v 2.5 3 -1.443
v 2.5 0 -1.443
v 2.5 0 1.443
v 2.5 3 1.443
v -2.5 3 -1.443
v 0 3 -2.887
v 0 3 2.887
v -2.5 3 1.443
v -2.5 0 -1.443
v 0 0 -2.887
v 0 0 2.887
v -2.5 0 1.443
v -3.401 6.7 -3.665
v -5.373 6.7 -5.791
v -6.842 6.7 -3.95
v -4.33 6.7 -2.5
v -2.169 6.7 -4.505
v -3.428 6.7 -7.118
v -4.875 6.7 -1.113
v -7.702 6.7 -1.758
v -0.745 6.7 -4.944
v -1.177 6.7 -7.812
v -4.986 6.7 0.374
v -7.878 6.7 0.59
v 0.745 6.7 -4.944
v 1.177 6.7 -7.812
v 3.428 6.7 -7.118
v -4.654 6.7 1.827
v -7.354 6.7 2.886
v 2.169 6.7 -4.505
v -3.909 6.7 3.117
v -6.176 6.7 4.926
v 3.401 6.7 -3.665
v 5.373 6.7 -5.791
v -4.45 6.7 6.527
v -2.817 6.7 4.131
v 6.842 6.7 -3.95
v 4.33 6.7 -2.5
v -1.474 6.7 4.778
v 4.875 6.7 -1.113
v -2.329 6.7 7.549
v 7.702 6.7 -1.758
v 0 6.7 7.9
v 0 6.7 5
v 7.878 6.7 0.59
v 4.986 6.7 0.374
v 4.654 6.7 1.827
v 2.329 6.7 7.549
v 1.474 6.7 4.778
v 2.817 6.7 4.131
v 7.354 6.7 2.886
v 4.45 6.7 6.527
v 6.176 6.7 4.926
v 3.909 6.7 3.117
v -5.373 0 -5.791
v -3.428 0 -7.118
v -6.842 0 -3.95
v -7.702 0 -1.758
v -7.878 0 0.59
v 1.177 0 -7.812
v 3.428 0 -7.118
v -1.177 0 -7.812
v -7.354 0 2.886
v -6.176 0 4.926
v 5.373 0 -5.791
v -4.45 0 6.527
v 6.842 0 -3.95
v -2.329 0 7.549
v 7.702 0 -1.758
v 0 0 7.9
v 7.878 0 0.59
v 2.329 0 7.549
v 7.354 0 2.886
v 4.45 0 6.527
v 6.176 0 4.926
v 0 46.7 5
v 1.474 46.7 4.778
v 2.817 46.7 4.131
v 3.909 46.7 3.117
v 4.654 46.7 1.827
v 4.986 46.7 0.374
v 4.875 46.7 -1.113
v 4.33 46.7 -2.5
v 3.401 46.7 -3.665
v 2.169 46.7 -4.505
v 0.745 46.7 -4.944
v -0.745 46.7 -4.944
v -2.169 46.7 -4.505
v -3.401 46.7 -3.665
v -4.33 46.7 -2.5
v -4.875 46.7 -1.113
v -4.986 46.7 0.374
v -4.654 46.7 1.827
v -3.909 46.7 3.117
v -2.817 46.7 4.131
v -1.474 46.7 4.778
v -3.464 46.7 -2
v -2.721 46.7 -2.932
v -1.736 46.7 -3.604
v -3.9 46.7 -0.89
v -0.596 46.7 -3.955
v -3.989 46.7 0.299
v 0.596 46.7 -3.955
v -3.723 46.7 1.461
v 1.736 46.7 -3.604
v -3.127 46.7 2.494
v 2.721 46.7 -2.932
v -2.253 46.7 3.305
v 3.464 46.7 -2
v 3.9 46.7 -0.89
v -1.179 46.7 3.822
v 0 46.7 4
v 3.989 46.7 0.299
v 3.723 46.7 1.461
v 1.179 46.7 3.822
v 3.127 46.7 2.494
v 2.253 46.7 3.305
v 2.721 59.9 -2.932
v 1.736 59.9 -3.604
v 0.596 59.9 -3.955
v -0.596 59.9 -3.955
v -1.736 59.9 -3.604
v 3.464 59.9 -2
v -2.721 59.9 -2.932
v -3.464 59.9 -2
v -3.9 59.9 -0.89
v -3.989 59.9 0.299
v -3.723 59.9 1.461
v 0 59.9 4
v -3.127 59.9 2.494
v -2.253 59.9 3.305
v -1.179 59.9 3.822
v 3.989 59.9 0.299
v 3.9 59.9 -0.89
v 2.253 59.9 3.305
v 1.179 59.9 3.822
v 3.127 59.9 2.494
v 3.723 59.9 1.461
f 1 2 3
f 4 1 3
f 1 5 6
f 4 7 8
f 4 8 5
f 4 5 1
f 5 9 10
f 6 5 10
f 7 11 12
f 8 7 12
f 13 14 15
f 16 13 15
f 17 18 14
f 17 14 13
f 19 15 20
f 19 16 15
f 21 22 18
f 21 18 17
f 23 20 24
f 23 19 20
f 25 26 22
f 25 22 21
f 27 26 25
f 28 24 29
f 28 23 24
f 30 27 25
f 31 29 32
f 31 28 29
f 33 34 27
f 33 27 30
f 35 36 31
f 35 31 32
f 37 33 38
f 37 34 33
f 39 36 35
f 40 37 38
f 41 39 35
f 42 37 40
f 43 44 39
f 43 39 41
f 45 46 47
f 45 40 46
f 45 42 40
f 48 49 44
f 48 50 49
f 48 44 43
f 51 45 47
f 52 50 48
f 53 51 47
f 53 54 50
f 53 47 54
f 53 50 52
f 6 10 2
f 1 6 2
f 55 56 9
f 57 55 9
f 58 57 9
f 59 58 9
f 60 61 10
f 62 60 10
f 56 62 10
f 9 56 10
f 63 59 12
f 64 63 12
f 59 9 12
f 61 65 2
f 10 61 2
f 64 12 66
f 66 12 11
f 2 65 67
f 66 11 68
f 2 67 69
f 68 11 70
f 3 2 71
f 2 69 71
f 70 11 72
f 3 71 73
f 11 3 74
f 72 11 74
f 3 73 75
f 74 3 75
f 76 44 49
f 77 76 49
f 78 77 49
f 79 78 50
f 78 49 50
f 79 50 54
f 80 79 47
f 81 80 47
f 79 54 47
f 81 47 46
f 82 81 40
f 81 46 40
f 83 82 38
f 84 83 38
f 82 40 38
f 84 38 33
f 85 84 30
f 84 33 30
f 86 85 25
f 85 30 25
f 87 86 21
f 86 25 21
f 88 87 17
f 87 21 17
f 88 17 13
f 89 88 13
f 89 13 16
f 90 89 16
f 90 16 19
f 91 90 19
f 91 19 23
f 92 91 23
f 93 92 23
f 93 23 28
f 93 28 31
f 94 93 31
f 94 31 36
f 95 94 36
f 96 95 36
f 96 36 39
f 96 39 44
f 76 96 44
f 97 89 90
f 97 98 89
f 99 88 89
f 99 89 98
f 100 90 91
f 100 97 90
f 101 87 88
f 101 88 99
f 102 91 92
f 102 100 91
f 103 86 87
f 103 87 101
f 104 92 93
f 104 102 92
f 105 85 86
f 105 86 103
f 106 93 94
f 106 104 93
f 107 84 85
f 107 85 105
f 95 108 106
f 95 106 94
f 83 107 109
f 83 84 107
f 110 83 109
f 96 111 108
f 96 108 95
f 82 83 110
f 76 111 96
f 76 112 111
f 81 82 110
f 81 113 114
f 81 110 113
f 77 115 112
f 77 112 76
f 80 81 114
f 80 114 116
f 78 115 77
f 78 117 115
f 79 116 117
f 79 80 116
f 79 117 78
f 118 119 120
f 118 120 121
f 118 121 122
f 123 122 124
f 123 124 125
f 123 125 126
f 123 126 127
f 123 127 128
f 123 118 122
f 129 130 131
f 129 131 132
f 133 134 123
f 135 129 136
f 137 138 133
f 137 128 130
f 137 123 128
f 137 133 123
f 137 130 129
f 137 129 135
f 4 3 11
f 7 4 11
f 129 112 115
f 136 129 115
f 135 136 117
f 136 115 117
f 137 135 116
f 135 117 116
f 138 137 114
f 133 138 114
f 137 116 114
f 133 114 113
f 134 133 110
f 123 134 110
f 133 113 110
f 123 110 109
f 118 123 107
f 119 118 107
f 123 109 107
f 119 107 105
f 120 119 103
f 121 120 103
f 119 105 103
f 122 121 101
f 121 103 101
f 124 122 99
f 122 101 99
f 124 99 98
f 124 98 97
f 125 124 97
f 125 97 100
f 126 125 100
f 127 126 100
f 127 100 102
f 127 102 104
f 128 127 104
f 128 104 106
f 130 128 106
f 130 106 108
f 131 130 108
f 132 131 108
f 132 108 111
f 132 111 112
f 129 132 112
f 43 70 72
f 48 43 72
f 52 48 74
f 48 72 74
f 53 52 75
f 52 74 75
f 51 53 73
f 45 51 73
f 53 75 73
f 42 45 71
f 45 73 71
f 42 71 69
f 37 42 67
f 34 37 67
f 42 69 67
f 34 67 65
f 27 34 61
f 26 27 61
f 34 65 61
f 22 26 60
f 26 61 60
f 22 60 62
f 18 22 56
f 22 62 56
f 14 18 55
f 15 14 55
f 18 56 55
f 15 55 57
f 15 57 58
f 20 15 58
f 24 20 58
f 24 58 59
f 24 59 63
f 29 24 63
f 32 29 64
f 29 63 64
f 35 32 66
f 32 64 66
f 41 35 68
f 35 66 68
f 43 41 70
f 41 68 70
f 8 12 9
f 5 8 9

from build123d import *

# Parameters (mm, degrees)
SKETCH_1_R          = 4
EXTRUDE_1_DEPTH     = 59.9
SKETCH_1_3_R        = 5
SKETCH_1_3_R_2      = 4
EXTRUDE_2_DEPTH     = 46.7
SKETCH_1_4_R        = 7.9
SKETCH_1_4_R_2      = 5
EXTRUDE_3_DEPTH     = 6.7
CUT_EXTRUDE_1_DEPTH = 3


with BuildPart() as part:
    # 草图1 → 凸台-拉伸1 (new body)
    with BuildSketch(Plane(origin=(0, 0, 0), x_dir=(1, 0, 0), z_dir=(0, 1, 0))):
        Circle(SKETCH_1_R)
    extrude(amount=EXTRUDE_1_DEPTH)

    # 草图1<3> → 凸台-拉伸2 (add)
    with BuildSketch(Plane(origin=(0, 0, 0), x_dir=(1, 0, 0), z_dir=(0, 1, 0))):
        Circle(SKETCH_1_3_R)
        Circle(SKETCH_1_3_R_2, mode=Mode.SUBTRACT)
    extrude(amount=EXTRUDE_2_DEPTH)

    # 草图1<4> → 凸台-拉伸3 (add)
    with BuildSketch(Plane(origin=(0, 0, 0), x_dir=(1, 0, 0), z_dir=(0, 1, 0))):
        Circle(SKETCH_1_4_R)
        Circle(SKETCH_1_4_R_2, mode=Mode.SUBTRACT)
    extrude(amount=EXTRUDE_3_DEPTH)

    # 草图2 → 切除-拉伸1 (cut)
    with BuildSketch(Plane.XZ):
        Polygon((2.5, 1.443375673), (0, 2.886751346), (-2.5, 1.443375673), (-2.5, -1.443375673), (0, -2.886751346), (2.5, -1.443375673), align=None)
    extrude(amount=-CUT_EXTRUDE_1_DEPTH, mode=Mode.SUBTRACT)


solid = part.part
